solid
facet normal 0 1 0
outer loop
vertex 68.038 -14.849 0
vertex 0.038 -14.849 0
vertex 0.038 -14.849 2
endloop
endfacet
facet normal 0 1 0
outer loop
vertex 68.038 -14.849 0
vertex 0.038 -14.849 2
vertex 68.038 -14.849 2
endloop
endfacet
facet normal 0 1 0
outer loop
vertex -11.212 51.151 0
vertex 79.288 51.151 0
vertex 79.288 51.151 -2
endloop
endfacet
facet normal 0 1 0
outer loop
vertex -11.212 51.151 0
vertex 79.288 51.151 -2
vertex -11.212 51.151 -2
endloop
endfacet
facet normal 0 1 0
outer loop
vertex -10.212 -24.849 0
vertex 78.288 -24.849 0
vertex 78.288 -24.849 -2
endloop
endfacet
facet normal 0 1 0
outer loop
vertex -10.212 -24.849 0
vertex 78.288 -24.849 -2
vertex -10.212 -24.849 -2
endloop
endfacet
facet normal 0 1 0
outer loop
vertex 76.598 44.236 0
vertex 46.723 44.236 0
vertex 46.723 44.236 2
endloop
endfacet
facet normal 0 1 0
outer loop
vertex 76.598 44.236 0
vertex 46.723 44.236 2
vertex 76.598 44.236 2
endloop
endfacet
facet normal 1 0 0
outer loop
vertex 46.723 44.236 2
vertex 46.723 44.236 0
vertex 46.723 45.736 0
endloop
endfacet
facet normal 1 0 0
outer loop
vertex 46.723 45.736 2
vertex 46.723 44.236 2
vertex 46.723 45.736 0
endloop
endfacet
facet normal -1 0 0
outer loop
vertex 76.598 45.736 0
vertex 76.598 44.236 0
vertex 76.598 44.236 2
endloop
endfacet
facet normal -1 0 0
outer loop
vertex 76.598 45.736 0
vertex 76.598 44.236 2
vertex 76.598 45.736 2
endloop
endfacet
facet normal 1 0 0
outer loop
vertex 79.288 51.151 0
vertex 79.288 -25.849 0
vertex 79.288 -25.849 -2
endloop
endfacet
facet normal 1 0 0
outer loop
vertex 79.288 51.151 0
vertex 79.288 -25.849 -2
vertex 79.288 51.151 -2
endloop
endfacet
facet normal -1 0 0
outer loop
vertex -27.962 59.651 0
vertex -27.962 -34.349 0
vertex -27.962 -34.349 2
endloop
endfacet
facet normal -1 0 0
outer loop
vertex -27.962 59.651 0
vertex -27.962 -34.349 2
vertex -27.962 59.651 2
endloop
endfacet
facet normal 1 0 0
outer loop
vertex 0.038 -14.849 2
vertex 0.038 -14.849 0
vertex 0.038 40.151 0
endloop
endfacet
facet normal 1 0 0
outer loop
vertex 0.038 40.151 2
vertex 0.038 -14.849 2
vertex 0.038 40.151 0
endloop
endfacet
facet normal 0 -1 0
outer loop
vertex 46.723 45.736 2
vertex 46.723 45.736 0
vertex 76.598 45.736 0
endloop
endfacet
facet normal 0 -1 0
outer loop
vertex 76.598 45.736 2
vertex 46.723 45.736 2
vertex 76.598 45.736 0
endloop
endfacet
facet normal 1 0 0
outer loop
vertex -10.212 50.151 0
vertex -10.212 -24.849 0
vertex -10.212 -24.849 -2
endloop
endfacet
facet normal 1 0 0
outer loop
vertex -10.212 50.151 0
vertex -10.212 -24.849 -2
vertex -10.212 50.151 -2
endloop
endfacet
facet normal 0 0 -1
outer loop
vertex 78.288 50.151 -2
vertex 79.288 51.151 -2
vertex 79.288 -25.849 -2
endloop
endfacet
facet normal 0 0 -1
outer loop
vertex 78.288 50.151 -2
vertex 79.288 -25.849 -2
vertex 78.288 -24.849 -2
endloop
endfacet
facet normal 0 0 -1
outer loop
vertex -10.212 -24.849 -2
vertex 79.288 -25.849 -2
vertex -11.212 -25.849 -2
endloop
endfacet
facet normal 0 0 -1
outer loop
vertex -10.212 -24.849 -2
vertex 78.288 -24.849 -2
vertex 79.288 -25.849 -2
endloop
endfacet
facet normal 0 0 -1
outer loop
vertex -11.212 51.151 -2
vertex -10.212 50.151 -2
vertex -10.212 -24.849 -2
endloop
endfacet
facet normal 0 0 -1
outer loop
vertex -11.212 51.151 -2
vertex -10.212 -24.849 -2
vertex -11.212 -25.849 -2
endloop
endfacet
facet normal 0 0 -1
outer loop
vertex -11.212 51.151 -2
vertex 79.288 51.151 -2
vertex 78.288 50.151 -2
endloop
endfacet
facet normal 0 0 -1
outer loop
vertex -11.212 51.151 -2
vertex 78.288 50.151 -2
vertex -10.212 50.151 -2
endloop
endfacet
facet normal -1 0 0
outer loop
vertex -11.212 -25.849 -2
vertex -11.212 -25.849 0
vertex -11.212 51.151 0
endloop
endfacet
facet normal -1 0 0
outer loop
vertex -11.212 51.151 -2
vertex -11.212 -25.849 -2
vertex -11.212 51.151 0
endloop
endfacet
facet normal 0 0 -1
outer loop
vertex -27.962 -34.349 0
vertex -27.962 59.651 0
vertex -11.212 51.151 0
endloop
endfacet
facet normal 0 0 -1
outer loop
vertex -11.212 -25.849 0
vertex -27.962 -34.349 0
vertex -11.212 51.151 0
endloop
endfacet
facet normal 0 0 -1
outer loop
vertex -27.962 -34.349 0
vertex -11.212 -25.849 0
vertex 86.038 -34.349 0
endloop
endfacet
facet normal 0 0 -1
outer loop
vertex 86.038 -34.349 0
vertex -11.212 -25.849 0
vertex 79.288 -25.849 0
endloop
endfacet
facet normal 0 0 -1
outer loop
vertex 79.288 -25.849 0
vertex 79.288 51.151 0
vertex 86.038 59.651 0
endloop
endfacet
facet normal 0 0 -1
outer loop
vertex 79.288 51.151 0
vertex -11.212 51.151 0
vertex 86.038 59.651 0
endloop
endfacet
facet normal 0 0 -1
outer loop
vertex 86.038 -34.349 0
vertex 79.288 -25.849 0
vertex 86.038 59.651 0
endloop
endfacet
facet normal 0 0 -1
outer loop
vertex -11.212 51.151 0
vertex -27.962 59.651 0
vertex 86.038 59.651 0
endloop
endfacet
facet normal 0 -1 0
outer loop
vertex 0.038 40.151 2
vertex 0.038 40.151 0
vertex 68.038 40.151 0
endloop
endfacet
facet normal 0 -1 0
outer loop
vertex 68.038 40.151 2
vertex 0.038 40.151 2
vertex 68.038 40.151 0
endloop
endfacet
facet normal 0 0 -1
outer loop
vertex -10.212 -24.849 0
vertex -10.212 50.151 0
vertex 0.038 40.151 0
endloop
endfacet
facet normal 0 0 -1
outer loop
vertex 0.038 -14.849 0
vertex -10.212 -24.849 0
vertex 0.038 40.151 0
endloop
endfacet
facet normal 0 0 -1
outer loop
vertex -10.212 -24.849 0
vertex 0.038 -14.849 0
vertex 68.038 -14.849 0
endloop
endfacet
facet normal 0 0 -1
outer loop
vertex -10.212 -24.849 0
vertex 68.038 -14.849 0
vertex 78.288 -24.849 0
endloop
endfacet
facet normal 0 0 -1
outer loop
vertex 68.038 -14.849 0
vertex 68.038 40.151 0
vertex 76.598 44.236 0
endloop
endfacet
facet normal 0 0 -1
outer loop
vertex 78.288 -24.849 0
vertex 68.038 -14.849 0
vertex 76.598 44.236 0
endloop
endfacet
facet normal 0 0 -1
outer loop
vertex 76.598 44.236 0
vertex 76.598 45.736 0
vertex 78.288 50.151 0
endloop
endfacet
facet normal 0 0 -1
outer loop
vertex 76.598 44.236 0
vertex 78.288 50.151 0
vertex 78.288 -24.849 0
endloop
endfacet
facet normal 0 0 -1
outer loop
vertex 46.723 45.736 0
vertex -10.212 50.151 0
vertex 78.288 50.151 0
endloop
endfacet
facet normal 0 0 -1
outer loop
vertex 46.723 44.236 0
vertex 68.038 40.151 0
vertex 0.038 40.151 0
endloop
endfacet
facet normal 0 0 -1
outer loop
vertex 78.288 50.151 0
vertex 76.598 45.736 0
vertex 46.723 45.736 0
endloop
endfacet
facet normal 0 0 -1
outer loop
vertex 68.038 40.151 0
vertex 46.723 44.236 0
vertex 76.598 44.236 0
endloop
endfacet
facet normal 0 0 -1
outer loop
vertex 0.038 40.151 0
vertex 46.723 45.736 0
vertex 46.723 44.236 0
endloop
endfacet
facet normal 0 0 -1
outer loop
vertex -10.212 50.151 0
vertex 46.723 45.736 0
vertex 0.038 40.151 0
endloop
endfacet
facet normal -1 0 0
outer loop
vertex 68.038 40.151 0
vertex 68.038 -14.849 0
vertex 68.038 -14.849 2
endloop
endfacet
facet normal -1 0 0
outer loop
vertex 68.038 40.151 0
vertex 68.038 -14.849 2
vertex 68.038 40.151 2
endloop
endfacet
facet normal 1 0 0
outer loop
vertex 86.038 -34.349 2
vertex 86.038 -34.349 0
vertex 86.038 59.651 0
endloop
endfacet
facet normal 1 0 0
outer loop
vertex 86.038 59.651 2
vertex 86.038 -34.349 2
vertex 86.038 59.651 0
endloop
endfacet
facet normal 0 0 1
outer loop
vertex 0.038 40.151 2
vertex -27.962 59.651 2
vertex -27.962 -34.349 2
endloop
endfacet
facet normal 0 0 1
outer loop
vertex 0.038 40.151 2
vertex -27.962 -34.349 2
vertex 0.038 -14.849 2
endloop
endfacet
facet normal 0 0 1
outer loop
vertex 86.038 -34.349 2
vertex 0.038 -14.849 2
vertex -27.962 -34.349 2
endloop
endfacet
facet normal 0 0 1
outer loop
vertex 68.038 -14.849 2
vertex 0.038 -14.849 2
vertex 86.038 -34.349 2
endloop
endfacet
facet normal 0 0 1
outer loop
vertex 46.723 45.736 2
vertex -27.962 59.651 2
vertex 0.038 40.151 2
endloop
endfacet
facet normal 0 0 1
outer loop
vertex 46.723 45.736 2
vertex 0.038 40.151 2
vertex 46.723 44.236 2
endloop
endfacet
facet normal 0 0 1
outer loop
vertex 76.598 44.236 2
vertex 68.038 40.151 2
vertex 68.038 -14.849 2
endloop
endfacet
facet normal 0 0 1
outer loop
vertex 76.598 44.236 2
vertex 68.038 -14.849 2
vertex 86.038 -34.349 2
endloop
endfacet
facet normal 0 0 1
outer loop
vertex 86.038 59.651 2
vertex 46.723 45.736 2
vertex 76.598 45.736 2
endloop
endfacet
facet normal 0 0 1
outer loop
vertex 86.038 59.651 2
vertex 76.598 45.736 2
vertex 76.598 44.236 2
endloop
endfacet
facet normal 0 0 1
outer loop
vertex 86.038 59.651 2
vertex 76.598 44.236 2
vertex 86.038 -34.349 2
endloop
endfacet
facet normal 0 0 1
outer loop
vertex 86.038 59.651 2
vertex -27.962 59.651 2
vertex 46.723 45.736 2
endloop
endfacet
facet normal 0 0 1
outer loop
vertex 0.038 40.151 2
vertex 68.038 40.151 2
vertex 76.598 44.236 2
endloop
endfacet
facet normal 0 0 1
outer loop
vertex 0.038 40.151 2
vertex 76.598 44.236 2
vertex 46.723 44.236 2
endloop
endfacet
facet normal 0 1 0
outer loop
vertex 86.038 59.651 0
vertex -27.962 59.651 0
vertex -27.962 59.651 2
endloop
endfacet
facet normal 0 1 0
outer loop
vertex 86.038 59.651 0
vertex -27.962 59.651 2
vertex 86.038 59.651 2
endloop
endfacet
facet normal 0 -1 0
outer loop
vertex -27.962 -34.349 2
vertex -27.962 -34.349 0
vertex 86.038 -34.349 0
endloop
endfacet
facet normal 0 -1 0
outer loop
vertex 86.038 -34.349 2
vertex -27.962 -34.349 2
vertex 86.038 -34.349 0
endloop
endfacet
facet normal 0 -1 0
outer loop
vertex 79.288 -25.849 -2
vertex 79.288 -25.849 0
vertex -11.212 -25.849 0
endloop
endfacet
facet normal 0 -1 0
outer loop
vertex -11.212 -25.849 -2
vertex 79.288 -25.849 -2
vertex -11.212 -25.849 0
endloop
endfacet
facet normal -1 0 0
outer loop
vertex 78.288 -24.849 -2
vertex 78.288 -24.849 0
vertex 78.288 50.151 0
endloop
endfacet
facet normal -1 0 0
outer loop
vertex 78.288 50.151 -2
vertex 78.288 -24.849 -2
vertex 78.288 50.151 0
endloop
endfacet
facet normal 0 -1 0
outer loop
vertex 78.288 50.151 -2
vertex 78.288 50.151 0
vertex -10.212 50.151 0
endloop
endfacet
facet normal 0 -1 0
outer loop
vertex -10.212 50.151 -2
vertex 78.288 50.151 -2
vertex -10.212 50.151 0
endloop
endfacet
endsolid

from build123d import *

# Parameters (mm, degrees)
SKETCH1_W                    = 114
SKETCH1_H                    = 94
SKETCH1_W_2                  = 68
SKETCH1_H_2                  = 55
BOSS_EXTRUDE1_DEPTH          = 2
CUT_EXTRUDE_THIN1_DEPTH      = 105.71269135
CUT_EXTRUDE_THIN1_DEPTH_BACK = 105.71269135
SKETCH3_W                    = 29.874962845
SKETCH3_H                    = 1.5
SKETCH2_W                    = 90.5
SKETCH2_H                    = 77
SKETCH2_W_2                  = 88.5
SKETCH2_H_2                  = 75
EXTRUDE_THIN3_DEPTH          = 2


with BuildPart() as part:
    # Sketch1 → Boss-Extrude1 (new body)
    with BuildSketch(Plane.XY):
        with Locations((29.037817342, 12.650999294)):
            Rectangle(SKETCH1_W, SKETCH1_H)
        with Locations((34.037817342, 12.650999294)):
            Rectangle(SKETCH1_W_2, SKETCH1_H_2, mode=Mode.SUBTRACT)
    extrude(amount=BOSS_EXTRUDE1_DEPTH)

    # Sketch3 → Cut-Extrude-Thin1 (cut, two sides: drawn at the far end of the back side and taken through both)
    with BuildSketch(Plane.XY.offset(2).offset(-CUT_EXTRUDE_THIN1_DEPTH_BACK)):
        with Locations((61.660151902, 44.986424276)):
            Rectangle(SKETCH3_W, SKETCH3_H)
    extrude(amount=CUT_EXTRUDE_THIN1_DEPTH + CUT_EXTRUDE_THIN1_DEPTH_BACK, mode=Mode.SUBTRACT)

    # Sketch2 → Extrude-Thin3 (add)
    with BuildSketch(Plane(origin=(0, 0, 0), x_dir=(-1, 0, 0), z_dir=(0, 0, -1))):
        with Locations((-34.037817342, 12.650999294)):
            Rectangle(SKETCH2_W, SKETCH2_H)
        with Locations((-34.037817342, 12.650999294)):
            Rectangle(SKETCH2_W_2, SKETCH2_H_2, mode=Mode.SUBTRACT)
    extrude(amount=EXTRUDE_THIN3_DEPTH)


solid = part.part
